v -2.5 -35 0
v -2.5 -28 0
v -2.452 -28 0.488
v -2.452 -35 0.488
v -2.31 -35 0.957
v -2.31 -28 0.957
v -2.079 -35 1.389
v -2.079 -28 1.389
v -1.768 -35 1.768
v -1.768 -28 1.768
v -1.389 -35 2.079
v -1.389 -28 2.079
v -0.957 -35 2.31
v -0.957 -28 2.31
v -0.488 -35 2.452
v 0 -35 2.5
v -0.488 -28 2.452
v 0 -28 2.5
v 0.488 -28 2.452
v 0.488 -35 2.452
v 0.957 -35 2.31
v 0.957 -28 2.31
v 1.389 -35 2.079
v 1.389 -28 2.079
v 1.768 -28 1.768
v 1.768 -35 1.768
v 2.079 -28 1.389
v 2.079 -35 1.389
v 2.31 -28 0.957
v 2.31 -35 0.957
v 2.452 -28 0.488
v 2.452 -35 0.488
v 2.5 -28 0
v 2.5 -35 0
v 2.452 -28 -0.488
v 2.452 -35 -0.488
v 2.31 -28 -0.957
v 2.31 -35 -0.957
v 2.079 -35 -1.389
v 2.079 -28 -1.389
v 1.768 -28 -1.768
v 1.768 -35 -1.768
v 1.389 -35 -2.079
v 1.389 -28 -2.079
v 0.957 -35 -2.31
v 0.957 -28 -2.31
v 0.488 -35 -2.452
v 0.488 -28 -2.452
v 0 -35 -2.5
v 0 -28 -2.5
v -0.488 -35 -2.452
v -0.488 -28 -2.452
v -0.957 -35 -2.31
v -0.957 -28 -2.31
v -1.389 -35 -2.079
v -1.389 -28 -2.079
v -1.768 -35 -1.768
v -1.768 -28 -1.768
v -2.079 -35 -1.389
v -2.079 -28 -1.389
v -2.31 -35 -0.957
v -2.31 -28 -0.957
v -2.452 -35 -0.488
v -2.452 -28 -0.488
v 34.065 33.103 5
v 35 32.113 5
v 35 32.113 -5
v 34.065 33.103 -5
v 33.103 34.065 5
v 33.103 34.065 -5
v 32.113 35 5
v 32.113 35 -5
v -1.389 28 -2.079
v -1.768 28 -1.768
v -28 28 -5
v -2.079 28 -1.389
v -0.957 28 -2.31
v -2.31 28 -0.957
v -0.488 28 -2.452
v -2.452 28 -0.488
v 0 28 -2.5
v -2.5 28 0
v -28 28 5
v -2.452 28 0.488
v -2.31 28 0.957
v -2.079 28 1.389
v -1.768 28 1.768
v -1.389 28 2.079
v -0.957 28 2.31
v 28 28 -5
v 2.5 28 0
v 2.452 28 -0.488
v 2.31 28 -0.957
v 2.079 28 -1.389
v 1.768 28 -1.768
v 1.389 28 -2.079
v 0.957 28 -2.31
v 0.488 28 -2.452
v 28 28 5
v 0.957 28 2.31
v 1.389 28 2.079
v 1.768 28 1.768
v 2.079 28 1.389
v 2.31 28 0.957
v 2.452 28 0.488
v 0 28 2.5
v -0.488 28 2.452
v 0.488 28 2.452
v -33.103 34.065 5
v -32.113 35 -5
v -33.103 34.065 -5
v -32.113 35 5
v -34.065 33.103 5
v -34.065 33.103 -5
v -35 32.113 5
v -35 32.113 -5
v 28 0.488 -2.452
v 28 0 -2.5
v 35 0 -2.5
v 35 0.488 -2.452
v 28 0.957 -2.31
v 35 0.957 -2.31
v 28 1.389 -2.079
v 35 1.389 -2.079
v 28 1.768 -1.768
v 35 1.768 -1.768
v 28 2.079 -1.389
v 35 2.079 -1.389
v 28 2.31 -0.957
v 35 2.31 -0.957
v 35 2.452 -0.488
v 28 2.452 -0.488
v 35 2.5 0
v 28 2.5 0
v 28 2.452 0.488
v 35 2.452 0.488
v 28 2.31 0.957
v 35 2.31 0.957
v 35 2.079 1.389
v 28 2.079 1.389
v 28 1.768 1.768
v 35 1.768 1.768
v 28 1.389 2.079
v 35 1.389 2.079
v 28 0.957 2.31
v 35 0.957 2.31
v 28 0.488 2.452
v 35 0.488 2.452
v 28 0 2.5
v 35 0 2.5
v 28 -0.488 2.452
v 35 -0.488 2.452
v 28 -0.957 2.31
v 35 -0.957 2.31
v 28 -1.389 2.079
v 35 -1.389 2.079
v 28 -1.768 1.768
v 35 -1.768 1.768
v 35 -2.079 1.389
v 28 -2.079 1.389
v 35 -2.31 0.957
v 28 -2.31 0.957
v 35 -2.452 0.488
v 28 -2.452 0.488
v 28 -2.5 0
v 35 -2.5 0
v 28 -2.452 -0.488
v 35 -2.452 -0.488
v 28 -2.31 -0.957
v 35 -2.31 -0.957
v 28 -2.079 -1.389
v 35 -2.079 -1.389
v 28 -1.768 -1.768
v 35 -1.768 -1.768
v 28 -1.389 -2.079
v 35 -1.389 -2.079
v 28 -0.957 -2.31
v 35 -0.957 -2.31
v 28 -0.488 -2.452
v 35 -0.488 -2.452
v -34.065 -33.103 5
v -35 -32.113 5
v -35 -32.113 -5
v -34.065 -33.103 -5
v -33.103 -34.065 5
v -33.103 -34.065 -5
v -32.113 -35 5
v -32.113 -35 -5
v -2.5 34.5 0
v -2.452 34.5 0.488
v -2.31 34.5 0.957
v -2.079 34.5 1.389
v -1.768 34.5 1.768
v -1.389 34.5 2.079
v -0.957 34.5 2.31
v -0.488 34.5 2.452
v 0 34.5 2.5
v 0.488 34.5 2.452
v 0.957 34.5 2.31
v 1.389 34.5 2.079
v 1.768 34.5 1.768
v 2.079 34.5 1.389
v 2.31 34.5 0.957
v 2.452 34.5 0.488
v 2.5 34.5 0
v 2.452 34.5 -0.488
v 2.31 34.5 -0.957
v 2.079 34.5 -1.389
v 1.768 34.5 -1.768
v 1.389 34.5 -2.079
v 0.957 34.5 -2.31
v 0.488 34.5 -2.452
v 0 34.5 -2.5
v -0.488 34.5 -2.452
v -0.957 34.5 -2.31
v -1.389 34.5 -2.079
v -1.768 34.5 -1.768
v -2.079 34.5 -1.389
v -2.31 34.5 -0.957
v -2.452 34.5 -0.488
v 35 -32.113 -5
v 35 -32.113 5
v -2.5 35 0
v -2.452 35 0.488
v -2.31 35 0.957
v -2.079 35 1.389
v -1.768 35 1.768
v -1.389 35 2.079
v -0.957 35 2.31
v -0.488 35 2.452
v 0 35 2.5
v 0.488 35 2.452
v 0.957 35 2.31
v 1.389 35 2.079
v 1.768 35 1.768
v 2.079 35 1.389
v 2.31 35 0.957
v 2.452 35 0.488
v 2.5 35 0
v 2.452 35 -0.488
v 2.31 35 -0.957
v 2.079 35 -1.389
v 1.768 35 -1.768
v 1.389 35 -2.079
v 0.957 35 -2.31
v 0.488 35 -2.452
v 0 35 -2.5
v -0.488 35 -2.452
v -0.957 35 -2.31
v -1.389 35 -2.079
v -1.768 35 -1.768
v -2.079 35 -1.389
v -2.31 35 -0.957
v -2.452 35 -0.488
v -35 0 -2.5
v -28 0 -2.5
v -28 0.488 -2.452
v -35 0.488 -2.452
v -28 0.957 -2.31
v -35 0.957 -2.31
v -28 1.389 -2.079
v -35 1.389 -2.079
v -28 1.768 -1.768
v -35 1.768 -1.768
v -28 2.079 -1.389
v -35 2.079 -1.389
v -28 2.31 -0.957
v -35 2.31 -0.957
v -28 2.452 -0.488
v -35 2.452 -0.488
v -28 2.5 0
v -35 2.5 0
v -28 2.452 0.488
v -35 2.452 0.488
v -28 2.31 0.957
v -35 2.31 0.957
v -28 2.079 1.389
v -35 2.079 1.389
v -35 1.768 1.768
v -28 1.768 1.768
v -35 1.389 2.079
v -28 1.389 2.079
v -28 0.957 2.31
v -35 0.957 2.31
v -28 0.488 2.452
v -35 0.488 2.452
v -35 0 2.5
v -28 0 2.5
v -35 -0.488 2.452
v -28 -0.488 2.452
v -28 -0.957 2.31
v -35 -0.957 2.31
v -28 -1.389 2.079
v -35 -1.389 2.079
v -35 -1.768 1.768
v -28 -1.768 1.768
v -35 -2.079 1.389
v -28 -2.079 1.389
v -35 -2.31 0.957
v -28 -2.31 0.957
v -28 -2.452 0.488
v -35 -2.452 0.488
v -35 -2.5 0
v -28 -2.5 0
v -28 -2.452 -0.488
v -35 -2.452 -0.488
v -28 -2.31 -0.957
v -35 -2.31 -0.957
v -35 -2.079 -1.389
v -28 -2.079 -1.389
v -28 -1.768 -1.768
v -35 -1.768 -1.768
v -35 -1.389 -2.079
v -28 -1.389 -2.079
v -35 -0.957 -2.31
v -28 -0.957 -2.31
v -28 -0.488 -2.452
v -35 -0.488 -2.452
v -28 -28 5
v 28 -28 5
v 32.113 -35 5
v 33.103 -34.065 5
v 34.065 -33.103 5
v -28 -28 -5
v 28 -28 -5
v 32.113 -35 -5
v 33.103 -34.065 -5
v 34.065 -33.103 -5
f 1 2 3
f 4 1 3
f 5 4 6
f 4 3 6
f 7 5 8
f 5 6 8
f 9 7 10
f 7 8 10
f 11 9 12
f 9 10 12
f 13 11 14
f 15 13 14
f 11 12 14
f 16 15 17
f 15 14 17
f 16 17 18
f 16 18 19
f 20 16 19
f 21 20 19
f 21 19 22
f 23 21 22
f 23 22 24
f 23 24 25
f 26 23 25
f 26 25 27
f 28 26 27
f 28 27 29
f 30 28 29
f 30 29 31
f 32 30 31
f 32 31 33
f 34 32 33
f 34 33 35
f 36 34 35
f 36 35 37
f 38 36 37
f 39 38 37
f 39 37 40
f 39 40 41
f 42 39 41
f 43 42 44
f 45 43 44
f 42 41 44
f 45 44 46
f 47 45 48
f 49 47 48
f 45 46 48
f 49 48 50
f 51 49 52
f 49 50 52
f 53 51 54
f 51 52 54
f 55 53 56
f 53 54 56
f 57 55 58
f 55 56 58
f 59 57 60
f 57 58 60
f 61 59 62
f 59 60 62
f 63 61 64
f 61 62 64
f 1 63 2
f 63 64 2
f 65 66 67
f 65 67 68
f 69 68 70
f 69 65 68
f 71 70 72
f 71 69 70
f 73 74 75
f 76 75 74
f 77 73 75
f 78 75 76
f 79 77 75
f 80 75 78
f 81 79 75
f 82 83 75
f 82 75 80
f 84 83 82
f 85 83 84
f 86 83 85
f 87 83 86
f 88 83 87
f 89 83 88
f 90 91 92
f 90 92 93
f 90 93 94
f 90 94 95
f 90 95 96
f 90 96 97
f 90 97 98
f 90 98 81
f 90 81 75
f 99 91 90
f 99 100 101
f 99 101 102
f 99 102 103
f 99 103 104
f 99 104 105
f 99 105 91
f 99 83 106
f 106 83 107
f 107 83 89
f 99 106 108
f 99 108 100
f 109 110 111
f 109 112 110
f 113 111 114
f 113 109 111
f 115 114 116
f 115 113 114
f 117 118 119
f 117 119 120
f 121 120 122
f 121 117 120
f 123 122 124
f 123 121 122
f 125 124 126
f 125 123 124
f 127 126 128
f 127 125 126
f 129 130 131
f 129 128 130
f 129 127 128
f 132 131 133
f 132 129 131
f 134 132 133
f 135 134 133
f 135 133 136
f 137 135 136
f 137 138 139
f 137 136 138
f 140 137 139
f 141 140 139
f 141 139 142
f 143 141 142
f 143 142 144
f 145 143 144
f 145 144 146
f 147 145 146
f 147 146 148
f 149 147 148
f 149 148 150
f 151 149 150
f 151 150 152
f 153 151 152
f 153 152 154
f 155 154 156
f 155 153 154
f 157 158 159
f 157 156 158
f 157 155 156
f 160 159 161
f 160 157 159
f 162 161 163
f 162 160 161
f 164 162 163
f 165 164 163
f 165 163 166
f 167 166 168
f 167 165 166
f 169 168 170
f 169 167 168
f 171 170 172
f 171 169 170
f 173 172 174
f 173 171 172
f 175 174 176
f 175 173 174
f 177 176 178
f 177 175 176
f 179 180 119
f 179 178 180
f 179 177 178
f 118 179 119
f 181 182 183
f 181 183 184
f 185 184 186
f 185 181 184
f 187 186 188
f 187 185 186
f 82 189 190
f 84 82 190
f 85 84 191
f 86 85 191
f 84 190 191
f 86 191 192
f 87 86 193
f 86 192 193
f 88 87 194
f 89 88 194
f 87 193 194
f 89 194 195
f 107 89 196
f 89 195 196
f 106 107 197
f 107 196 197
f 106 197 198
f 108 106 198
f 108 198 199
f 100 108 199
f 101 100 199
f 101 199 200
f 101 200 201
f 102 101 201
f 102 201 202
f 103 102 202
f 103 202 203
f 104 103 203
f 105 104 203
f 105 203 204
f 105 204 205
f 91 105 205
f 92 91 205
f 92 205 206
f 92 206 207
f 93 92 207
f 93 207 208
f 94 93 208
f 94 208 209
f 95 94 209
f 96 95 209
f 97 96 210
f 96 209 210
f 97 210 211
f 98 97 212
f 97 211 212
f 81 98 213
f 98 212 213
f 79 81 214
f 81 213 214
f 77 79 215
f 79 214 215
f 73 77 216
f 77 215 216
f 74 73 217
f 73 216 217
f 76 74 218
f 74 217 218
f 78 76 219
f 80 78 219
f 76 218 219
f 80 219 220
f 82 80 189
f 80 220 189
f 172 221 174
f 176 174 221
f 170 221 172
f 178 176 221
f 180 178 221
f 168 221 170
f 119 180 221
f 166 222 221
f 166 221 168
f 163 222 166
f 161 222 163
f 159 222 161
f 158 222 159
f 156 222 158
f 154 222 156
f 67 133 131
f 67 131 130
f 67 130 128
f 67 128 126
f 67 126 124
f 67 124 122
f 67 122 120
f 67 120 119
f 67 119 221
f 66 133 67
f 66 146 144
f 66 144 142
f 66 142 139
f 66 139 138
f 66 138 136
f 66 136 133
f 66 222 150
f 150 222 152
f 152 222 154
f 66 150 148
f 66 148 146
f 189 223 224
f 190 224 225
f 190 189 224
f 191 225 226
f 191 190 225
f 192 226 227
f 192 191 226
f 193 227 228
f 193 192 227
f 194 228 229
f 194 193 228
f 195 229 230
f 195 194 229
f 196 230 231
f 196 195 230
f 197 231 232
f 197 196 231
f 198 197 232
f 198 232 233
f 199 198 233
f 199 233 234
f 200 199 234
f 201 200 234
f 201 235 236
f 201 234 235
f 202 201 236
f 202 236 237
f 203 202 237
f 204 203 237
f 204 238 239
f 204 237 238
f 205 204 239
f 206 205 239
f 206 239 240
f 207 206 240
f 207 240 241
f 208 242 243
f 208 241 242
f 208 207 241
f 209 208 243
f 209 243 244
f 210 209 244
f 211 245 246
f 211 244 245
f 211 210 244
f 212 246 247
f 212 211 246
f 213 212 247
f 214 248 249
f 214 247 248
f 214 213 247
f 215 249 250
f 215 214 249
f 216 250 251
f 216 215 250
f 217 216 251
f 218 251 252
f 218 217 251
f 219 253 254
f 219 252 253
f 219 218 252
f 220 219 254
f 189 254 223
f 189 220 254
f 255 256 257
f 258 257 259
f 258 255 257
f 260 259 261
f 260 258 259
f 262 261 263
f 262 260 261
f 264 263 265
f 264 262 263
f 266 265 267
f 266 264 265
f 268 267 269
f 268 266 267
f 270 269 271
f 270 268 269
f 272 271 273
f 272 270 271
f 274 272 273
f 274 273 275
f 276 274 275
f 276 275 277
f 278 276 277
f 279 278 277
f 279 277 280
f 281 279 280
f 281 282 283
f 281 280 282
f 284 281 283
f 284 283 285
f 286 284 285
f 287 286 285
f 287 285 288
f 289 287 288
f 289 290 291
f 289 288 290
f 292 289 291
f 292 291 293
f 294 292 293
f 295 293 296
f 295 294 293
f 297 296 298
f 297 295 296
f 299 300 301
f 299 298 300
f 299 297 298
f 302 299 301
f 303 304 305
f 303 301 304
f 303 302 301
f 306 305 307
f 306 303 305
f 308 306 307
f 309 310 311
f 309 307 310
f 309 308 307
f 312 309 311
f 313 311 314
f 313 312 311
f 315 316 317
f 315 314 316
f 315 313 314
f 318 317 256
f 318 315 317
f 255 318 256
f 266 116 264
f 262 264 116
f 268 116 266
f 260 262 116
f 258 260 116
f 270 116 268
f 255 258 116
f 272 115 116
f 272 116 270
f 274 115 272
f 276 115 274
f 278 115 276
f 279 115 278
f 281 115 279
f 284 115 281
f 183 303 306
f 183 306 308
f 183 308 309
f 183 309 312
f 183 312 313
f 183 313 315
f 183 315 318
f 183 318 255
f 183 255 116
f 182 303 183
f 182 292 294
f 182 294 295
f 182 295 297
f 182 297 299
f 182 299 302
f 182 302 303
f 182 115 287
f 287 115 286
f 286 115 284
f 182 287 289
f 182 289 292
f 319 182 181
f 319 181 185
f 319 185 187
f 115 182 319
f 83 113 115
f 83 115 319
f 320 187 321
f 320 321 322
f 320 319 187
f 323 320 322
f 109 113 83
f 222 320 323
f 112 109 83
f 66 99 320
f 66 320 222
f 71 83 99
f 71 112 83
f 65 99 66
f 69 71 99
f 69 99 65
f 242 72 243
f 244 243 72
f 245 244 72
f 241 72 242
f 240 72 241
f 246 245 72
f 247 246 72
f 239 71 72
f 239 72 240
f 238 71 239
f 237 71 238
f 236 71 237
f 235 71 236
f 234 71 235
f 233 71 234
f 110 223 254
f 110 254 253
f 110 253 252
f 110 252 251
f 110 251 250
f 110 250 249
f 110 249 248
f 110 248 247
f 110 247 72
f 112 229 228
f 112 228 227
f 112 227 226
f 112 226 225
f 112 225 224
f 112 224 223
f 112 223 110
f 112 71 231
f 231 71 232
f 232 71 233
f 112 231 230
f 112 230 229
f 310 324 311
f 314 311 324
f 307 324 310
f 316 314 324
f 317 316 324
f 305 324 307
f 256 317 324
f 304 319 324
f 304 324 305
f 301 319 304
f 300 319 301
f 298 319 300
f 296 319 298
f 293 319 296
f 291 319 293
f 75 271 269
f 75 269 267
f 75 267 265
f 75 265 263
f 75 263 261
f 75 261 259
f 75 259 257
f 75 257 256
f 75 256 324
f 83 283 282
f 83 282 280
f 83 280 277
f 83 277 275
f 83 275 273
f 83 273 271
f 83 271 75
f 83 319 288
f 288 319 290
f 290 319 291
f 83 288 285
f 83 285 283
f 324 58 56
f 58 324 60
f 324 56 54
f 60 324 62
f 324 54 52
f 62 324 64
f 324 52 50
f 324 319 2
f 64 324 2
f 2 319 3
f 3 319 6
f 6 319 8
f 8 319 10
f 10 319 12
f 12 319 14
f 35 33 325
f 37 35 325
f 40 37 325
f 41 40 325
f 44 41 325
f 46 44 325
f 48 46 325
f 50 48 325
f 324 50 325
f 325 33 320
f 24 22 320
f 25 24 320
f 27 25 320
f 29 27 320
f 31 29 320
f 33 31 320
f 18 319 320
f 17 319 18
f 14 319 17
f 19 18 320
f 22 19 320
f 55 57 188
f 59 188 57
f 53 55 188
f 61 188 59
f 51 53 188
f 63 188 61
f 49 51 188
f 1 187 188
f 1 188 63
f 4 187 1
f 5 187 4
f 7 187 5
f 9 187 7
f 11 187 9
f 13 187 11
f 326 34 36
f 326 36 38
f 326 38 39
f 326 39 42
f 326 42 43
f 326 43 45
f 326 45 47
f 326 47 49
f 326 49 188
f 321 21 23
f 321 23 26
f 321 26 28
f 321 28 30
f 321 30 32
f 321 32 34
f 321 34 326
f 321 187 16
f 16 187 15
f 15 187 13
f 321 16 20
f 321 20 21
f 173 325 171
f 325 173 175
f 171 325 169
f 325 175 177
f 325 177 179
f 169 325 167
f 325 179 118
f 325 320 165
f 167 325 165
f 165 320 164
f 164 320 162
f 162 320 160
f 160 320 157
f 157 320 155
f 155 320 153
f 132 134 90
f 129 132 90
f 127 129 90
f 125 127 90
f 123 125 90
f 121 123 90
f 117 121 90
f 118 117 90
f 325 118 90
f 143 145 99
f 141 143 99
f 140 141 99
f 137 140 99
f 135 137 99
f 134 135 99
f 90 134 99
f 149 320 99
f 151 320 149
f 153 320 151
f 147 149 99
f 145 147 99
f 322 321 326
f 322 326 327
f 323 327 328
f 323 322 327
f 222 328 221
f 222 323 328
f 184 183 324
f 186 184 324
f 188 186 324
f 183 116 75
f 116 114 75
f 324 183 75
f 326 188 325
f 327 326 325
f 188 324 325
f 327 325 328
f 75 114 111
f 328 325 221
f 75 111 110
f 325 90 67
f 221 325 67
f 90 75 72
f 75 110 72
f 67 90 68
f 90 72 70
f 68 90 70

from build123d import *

# Parameters (mm, degrees)
PAD_DEPTH            = 5
SKETCH017_W          = 56
SKETCH017_H          = 56
POCKET_DEPTH         = 5.001
POCKET_DEPTH_BACK    = 5.001
SKETCH004_R          = 2.5
POCKET010_DEPTH      = 69.501
POCKET010_DEPTH_BACK = 0.501
SKETCH003_R          = 2.5
POCKET011_DEPTH      = 0.001
POCKET011_DEPTH_BACK = 70.001


with BuildPart() as part:
    # Sketch → Pad (new body, symmetric)
    with BuildSketch(Plane.XY):
        with BuildLine():
            Line((-35, 32.113081), (-35, -32.113081))
            ThreePointArc((-35, -32.113081), (-33.587572, -33.587572), (-32.113081, -35))
            Line((-32.113081, -35), (32.113081, -35))
            ThreePointArc((32.113081, -35), (33.587572, -33.587572), (35, -32.113081))
            Line((35, -32.113081), (35, 32.113081))
            ThreePointArc((35, 32.113081), (33.587572, 33.587572), (32.113081, 35))
            Line((32.113081, 35), (-32.113081, 35))
            ThreePointArc((-32.113081, 35), (-33.587572, 33.587572), (-35, 32.113081))
        make_face()
    extrude(amount=PAD_DEPTH, both=True)

    # Sketch017 → Pocket (cut, two sides)
    with BuildSketch(Plane.XY) as pocket_sk:
        Rectangle(SKETCH017_W, SKETCH017_H)
    extrude(amount=-POCKET_DEPTH, mode=Mode.SUBTRACT)
    extrude(pocket_sk.sketch, amount=POCKET_DEPTH_BACK, mode=Mode.SUBTRACT)

    # Sketch004 → Pocket010 (cut, two sides)
    with BuildSketch(Plane(origin=(0, 34.5, 0), x_dir=(-1, 0, 0), z_dir=(0, 1, 0))) as pocket010_sk:
        Circle(SKETCH004_R)
    extrude(amount=-POCKET010_DEPTH, mode=Mode.SUBTRACT)
    extrude(pocket010_sk.sketch, amount=POCKET010_DEPTH_BACK, mode=Mode.SUBTRACT)

    # Sketch003 → Pocket011 (cut, two sides)
    with BuildSketch(Plane(origin=(-35, 0, 0), x_dir=(0, 0, -1), z_dir=(1, 0, 0))) as pocket011_sk:
        Circle(SKETCH003_R)
    extrude(amount=-POCKET011_DEPTH, mode=Mode.SUBTRACT)
    extrude(pocket011_sk.sketch, amount=POCKET011_DEPTH_BACK, mode=Mode.SUBTRACT)


solid = part.part
